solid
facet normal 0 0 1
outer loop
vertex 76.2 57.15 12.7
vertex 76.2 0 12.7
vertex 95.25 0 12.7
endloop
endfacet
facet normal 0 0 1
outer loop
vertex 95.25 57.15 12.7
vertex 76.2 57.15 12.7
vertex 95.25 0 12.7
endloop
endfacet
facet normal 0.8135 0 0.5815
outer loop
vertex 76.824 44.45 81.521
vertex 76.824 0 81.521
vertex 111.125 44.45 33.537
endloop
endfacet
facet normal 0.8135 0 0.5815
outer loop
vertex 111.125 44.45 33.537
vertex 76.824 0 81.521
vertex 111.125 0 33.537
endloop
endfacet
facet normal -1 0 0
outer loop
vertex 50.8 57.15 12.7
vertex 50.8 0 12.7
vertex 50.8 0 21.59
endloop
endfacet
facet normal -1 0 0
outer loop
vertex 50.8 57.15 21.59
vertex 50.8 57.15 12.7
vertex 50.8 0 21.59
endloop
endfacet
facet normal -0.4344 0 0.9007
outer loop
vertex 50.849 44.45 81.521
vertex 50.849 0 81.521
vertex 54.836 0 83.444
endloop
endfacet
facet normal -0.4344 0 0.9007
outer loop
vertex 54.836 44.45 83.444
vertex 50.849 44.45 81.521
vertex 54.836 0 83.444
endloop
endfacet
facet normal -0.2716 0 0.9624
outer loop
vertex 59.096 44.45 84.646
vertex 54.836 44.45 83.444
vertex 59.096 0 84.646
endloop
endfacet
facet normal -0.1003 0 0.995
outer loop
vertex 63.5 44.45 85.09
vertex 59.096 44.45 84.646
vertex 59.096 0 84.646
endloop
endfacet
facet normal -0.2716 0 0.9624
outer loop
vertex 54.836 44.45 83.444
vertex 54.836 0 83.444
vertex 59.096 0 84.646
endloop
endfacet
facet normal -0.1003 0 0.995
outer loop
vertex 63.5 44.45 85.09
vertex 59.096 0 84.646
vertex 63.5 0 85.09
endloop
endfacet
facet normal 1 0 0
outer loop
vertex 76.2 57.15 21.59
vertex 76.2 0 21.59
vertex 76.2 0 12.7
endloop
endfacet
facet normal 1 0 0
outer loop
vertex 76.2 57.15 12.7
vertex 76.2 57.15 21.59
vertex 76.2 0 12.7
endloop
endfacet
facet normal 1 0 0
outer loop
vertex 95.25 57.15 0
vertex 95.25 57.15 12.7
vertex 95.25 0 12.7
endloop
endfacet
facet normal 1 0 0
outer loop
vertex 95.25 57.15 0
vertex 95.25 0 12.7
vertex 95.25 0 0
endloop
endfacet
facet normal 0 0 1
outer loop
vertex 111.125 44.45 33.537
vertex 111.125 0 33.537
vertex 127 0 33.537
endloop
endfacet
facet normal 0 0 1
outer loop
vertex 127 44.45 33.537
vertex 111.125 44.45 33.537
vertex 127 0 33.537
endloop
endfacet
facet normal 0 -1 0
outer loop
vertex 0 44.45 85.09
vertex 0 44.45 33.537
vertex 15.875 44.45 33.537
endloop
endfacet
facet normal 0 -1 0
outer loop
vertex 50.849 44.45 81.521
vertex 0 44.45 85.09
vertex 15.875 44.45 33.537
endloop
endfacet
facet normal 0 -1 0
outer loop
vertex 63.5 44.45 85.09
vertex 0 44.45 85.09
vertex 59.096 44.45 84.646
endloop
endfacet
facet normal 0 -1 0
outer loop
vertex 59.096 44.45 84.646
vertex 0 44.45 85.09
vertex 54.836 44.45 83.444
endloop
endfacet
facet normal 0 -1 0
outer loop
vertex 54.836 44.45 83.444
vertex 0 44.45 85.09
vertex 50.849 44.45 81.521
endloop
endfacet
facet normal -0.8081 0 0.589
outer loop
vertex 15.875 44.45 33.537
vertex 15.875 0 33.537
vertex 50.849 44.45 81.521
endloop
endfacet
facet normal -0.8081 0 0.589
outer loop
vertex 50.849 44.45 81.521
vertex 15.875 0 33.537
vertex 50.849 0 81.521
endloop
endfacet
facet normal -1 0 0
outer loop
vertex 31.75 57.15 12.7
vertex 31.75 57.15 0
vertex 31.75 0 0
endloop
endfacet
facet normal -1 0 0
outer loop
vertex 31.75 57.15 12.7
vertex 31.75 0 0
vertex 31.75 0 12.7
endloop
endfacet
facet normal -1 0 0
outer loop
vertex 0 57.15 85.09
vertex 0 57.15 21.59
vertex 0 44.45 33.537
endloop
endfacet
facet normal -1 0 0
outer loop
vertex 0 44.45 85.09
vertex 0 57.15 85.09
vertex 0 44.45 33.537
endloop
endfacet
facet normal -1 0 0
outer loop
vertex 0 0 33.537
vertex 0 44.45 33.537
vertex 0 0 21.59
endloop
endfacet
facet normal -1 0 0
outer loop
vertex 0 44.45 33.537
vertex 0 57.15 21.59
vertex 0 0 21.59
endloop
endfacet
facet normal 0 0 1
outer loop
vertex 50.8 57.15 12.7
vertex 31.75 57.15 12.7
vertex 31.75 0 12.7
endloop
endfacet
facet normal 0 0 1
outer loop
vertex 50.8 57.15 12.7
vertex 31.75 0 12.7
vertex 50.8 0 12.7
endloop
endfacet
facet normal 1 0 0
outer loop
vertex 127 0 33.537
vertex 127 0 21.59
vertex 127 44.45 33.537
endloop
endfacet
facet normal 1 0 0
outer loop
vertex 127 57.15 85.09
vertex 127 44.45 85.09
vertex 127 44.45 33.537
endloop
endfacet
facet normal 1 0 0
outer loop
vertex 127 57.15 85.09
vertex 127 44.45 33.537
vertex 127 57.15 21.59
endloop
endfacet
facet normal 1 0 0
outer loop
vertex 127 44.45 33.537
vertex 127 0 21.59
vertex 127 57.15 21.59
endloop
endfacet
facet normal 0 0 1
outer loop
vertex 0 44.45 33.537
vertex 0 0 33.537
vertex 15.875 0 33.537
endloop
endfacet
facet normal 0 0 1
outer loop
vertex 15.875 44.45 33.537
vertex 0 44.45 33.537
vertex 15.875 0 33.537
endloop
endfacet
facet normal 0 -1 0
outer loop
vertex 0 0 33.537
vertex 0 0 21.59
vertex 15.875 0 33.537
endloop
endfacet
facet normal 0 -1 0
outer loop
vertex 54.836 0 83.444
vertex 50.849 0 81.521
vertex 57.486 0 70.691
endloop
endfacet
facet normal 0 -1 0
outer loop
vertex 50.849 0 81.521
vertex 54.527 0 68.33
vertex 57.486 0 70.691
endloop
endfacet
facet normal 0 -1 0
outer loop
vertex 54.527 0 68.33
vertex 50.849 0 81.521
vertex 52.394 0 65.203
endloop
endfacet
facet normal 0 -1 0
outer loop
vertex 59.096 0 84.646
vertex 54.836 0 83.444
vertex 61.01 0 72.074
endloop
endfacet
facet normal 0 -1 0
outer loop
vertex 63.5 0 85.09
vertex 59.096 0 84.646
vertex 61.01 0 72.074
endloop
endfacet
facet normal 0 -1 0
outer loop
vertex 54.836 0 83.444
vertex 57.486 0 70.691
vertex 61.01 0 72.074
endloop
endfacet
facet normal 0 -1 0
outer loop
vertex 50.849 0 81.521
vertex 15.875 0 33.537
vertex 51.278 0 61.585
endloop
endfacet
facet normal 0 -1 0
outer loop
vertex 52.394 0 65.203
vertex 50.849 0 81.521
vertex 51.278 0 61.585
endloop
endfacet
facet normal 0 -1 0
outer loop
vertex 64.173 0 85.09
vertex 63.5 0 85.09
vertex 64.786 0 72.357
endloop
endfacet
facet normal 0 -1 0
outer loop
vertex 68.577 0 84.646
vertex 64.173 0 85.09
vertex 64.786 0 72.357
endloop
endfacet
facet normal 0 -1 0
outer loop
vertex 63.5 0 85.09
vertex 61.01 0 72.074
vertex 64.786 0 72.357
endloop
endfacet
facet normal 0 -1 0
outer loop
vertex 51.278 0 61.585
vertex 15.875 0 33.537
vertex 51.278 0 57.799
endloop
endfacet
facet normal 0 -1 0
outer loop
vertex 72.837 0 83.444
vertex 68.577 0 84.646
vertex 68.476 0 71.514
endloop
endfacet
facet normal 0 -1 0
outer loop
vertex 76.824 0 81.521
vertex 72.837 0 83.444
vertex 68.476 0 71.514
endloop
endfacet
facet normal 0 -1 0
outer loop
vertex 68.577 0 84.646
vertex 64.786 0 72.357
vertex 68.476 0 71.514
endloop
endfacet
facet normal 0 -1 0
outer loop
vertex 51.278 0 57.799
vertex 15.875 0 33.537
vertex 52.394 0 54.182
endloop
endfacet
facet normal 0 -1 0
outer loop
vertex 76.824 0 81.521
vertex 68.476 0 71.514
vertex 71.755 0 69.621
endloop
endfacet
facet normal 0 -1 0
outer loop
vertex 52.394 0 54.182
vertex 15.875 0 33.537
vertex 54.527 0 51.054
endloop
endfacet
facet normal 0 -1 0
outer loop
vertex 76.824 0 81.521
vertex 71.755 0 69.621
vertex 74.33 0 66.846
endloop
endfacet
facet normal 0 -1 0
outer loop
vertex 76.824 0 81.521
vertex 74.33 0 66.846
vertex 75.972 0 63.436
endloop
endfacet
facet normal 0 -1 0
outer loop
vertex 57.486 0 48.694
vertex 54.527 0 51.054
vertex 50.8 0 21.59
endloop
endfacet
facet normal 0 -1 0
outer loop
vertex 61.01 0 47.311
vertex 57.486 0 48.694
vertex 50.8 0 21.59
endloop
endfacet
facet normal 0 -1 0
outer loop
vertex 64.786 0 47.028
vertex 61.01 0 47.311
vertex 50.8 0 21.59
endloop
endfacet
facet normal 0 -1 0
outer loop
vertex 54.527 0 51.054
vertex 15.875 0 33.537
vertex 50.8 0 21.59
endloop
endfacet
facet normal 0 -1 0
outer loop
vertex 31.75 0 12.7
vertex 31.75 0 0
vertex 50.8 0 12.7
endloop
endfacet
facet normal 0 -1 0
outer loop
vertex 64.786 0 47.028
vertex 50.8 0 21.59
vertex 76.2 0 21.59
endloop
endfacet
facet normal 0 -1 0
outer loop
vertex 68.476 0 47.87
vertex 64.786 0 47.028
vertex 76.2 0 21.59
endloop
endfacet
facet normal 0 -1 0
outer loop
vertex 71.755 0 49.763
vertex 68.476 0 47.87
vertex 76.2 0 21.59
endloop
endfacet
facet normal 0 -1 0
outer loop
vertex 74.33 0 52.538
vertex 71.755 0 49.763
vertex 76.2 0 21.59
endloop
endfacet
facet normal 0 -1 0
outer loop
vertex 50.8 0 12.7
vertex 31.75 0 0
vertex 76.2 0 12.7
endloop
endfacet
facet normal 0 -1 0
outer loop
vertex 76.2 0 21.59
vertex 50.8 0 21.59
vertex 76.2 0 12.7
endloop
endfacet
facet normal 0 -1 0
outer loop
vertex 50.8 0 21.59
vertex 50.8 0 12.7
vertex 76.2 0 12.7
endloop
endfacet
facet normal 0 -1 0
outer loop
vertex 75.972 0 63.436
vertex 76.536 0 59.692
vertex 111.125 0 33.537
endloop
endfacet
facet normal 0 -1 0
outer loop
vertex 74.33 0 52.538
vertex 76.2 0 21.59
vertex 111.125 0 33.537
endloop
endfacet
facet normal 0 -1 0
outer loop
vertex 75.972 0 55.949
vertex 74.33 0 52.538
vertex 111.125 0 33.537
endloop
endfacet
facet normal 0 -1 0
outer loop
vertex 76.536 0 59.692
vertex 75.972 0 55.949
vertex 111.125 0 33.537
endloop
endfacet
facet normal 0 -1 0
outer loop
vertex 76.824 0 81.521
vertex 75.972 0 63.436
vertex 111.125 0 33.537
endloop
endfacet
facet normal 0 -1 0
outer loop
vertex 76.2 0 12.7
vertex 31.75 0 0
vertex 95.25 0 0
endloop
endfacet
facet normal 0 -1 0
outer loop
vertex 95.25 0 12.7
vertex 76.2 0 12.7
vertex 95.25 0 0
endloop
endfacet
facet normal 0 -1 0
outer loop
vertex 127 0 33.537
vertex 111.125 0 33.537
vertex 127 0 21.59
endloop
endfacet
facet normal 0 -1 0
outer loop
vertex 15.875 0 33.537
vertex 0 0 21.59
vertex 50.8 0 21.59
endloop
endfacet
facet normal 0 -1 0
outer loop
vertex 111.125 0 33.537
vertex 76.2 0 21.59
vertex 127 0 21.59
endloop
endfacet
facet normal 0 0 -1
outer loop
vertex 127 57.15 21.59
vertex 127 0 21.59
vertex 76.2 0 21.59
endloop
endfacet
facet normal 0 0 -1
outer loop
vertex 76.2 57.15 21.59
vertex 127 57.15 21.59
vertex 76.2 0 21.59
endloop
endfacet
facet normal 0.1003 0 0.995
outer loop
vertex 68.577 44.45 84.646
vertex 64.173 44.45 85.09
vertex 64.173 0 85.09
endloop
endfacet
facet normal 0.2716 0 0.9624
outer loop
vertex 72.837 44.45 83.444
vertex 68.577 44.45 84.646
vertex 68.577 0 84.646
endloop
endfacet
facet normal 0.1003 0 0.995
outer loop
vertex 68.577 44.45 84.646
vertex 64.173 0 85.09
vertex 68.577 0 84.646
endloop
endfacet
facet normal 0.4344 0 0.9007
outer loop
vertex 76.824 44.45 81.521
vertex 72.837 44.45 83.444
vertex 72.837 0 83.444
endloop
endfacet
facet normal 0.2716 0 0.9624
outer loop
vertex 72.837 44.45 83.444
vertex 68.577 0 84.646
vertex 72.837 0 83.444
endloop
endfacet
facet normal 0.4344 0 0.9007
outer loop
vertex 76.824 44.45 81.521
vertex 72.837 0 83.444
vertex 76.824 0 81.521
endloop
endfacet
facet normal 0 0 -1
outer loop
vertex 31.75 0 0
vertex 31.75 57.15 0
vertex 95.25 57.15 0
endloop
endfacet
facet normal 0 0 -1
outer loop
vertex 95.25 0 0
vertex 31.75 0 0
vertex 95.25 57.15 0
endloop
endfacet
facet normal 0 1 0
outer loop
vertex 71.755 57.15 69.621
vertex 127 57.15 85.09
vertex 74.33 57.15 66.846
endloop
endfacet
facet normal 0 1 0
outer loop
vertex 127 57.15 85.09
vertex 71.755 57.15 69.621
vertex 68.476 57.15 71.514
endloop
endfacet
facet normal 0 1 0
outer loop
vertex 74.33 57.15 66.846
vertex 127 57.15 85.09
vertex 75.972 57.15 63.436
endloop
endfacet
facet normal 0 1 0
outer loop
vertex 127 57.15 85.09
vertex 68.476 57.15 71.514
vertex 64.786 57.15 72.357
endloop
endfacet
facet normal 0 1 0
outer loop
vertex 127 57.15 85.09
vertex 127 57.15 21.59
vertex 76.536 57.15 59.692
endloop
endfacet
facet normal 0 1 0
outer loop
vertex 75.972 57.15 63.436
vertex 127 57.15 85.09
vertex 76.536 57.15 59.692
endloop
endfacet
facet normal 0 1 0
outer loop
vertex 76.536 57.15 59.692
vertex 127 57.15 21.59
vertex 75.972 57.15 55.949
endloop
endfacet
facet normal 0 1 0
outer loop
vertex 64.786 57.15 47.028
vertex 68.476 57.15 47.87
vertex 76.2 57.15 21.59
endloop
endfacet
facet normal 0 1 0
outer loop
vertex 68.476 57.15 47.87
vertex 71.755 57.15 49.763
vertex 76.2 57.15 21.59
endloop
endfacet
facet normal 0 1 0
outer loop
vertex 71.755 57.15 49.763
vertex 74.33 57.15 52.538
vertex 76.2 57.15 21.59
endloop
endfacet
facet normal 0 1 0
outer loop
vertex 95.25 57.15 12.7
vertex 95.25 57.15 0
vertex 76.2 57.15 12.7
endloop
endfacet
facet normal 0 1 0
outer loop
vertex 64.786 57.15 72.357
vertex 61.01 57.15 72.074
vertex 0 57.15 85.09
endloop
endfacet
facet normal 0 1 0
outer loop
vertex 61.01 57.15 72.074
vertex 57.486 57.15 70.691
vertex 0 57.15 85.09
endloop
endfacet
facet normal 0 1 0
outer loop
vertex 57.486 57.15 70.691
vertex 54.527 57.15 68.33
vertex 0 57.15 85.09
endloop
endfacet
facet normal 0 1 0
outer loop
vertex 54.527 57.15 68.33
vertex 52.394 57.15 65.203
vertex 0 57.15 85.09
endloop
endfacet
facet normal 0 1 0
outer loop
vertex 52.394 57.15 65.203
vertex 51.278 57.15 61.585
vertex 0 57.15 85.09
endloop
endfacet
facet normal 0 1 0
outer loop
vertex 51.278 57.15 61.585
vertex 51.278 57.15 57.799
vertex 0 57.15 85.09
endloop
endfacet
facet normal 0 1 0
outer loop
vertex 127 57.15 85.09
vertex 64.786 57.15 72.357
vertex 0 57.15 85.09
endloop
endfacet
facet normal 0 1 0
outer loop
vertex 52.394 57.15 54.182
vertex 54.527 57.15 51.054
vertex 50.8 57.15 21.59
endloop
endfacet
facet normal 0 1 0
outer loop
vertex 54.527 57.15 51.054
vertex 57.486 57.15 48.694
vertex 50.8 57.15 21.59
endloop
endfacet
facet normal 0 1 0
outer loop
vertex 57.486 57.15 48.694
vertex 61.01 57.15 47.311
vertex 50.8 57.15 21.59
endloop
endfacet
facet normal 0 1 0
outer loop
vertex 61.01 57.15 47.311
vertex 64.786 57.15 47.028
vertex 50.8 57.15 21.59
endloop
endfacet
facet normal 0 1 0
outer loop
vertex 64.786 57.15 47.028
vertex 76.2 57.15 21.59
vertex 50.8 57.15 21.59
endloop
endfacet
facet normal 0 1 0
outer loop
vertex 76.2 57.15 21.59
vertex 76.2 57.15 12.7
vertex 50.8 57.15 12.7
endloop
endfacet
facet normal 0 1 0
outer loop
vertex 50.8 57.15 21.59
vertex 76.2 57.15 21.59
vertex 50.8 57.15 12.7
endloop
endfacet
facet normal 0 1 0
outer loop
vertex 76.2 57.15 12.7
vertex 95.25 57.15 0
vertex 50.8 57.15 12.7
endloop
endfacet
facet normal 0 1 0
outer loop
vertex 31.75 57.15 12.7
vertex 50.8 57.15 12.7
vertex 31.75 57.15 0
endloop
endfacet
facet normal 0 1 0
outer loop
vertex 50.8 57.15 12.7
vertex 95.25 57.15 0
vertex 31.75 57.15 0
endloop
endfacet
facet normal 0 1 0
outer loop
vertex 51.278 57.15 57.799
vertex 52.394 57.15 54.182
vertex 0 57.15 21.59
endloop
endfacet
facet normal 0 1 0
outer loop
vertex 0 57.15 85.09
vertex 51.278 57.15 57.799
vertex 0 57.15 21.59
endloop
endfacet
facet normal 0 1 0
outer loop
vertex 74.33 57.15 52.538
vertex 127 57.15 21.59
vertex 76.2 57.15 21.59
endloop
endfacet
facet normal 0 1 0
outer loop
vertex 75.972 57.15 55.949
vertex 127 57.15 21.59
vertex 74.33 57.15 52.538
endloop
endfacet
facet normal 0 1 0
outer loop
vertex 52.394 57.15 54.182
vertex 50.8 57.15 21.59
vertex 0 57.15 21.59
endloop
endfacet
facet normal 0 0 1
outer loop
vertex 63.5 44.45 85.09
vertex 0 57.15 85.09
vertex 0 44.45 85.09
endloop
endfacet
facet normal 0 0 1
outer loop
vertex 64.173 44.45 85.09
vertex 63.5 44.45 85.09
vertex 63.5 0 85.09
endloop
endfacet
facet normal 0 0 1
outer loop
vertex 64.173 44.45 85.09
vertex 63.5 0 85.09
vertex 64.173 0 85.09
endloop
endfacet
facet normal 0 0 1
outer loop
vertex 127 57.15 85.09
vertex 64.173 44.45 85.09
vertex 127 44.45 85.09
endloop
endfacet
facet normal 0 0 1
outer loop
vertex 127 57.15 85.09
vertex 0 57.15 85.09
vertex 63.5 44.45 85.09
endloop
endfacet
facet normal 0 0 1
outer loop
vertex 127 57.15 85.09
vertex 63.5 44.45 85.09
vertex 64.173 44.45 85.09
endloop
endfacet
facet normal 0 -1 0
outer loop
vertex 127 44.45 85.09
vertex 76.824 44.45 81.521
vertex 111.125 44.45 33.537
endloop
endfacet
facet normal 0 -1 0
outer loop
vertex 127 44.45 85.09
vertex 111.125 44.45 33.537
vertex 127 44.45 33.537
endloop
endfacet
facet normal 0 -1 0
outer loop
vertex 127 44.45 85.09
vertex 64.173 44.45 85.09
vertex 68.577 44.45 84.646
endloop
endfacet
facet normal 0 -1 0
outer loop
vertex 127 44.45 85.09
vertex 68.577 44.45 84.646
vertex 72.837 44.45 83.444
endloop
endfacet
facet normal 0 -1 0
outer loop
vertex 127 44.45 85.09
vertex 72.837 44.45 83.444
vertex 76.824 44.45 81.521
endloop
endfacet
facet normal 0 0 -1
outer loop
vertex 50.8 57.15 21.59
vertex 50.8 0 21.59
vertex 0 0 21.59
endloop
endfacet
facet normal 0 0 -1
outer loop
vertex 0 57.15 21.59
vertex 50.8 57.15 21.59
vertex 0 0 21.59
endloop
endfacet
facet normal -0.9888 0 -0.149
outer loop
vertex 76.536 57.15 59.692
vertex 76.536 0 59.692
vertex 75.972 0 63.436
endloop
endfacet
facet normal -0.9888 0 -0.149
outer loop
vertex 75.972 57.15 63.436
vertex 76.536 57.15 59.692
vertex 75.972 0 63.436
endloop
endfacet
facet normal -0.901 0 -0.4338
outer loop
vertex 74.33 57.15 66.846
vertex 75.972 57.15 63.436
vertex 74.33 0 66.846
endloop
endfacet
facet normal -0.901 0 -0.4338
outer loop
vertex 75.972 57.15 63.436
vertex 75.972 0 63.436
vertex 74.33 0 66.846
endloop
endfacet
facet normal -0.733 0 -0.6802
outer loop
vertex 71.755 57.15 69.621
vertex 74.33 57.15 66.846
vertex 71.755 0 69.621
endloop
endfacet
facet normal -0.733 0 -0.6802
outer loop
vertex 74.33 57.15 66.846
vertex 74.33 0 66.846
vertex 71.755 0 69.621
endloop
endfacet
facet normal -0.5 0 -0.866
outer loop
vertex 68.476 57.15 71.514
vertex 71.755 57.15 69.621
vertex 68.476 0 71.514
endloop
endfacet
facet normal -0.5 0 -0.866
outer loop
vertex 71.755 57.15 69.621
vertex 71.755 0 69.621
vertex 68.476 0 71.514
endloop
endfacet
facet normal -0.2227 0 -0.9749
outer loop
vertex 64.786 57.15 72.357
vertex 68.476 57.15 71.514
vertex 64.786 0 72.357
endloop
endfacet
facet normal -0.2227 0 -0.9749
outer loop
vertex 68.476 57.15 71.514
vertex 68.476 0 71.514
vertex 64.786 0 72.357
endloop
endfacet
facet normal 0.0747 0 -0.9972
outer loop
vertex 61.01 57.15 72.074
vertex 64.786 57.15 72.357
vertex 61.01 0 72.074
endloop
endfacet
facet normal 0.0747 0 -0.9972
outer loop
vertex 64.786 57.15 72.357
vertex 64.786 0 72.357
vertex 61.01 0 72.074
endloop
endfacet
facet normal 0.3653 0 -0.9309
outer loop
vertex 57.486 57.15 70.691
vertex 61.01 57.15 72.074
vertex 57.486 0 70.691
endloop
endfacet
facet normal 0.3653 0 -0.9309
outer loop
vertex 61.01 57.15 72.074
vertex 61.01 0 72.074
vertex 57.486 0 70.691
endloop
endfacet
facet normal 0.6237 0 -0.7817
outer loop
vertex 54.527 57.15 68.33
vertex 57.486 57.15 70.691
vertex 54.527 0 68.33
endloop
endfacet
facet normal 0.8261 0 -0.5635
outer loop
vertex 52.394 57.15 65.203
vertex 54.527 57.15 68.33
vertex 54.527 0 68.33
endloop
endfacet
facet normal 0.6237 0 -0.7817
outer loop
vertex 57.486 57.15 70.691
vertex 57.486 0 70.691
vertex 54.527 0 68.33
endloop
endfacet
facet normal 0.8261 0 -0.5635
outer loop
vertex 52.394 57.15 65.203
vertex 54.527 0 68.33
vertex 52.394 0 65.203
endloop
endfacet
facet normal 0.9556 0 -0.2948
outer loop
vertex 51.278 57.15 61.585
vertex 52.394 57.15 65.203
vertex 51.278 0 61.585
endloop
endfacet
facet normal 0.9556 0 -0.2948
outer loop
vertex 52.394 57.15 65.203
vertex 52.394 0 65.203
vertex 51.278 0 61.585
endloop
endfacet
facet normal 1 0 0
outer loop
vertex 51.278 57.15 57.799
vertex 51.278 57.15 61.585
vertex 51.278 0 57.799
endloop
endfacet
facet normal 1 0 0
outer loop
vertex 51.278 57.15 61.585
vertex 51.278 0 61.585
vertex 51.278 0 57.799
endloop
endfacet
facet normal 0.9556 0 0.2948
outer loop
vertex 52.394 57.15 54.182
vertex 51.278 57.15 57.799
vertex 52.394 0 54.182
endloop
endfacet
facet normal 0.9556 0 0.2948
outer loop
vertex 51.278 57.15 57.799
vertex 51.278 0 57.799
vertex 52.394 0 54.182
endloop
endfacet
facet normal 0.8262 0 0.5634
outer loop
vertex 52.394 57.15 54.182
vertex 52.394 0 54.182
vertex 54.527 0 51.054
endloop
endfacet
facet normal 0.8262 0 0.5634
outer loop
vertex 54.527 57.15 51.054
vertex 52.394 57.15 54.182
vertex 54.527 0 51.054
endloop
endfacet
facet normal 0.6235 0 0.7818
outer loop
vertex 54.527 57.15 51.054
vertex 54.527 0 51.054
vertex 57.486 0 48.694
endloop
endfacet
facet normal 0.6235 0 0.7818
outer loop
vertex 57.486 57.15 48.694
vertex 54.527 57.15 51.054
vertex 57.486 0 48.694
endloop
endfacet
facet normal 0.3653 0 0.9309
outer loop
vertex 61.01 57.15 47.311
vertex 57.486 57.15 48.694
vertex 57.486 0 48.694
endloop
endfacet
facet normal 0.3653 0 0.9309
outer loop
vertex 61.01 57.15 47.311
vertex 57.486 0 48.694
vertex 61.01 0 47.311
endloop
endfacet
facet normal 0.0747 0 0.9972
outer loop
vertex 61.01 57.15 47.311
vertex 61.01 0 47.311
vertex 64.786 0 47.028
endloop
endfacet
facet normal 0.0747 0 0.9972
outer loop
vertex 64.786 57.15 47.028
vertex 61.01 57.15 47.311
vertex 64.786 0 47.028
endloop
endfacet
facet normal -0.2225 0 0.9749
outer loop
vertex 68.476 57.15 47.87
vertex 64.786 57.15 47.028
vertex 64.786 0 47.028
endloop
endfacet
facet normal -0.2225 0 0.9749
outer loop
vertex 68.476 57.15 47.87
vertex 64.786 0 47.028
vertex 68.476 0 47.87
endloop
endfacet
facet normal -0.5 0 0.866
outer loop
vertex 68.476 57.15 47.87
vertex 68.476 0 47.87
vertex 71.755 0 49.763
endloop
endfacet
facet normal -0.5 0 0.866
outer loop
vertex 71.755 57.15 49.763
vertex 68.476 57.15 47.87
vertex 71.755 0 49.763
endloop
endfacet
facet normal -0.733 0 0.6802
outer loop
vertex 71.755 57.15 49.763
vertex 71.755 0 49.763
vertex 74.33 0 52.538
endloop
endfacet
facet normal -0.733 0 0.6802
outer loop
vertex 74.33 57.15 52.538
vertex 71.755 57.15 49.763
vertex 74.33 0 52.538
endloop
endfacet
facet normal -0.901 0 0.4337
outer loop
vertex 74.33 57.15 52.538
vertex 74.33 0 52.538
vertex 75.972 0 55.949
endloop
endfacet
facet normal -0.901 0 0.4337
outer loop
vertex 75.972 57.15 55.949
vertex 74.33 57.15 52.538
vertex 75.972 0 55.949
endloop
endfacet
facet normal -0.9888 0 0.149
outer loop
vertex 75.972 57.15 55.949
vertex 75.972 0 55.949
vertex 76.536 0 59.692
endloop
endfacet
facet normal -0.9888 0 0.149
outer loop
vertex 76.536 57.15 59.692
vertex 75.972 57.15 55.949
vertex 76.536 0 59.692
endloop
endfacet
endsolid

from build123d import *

# Parameters (mm, degrees)
F0_W     = 15.875
F0_H     = 44.45
F0_W_2   = 95.25
F1_DEPTH = 85.09
F3_DEPTH = 44.45
F2_R     = 12.7
F4_DEPTH = 57.151


with BuildPart() as f1:
    # F0 (on Top) → F1 (new body)
    with BuildSketch(Plane.XY):
        with Locations((7.9375, 22.225)):
            Rectangle(F0_W, F0_H)
        with Locations((63.5, 22.225)):
            Rectangle(F0_W_2, F0_H)
        Polygon((0, 57.15), (0, 44.45), (15.875, 44.45), (111.125, 44.45), (127, 44.45), (127, 57.15), align=None)
        with Locations((119.0625, 22.225)):
            Rectangle(F0_W, F0_H)
    extrude(amount=F1_DEPTH)

    # F2 (on face) → F3 (cut)
    with BuildSketch(Plane.XZ):
        with BuildLine():
            Line((63.5, 85.09), (0, 85.09))
            Line((0, 85.09), (0, 33.536568))
            Line((0, 33.536568), (15.875, 33.536568))
            Line((15.875, 33.536568), (50.849151, 81.520875))
            ThreePointArc((50.849151, 81.520875), (56.939695, 84.137978), (63.5, 85.09))
        make_face()
        with BuildLine():
            Line((127, 85.09), (64.172919, 85.09))
            ThreePointArc((64.172919, 85.09), (70.733224, 84.137978), (76.823767, 81.520875))
            Line((76.823767, 81.520875), (111.125, 33.536568))
            Line((111.125, 33.536568), (127, 33.536568))
            Line((127, 33.536568), (127, 85.09))
        make_face()
    extrude(amount=-F3_DEPTH, mode=Mode.SUBTRACT)

    # F2 (on face) → F4 (cut, through all)
    with BuildSketch(Plane.XZ):
        Polygon((127, 0), (127, 21.59), (76.2, 21.59), (76.2, 12.7), (95.25, 12.7), (95.25, 0), align=None)
        Polygon((50.8, 21.59), (0, 21.59), (0, 0), (31.75, 0), (31.75, 12.7), (50.8, 12.7), align=None)
        with Locations((63.836459, 59.692229)):
            Circle(F2_R)
    extrude(amount=-F4_DEPTH, mode=Mode.SUBTRACT)


solid = f1.part
